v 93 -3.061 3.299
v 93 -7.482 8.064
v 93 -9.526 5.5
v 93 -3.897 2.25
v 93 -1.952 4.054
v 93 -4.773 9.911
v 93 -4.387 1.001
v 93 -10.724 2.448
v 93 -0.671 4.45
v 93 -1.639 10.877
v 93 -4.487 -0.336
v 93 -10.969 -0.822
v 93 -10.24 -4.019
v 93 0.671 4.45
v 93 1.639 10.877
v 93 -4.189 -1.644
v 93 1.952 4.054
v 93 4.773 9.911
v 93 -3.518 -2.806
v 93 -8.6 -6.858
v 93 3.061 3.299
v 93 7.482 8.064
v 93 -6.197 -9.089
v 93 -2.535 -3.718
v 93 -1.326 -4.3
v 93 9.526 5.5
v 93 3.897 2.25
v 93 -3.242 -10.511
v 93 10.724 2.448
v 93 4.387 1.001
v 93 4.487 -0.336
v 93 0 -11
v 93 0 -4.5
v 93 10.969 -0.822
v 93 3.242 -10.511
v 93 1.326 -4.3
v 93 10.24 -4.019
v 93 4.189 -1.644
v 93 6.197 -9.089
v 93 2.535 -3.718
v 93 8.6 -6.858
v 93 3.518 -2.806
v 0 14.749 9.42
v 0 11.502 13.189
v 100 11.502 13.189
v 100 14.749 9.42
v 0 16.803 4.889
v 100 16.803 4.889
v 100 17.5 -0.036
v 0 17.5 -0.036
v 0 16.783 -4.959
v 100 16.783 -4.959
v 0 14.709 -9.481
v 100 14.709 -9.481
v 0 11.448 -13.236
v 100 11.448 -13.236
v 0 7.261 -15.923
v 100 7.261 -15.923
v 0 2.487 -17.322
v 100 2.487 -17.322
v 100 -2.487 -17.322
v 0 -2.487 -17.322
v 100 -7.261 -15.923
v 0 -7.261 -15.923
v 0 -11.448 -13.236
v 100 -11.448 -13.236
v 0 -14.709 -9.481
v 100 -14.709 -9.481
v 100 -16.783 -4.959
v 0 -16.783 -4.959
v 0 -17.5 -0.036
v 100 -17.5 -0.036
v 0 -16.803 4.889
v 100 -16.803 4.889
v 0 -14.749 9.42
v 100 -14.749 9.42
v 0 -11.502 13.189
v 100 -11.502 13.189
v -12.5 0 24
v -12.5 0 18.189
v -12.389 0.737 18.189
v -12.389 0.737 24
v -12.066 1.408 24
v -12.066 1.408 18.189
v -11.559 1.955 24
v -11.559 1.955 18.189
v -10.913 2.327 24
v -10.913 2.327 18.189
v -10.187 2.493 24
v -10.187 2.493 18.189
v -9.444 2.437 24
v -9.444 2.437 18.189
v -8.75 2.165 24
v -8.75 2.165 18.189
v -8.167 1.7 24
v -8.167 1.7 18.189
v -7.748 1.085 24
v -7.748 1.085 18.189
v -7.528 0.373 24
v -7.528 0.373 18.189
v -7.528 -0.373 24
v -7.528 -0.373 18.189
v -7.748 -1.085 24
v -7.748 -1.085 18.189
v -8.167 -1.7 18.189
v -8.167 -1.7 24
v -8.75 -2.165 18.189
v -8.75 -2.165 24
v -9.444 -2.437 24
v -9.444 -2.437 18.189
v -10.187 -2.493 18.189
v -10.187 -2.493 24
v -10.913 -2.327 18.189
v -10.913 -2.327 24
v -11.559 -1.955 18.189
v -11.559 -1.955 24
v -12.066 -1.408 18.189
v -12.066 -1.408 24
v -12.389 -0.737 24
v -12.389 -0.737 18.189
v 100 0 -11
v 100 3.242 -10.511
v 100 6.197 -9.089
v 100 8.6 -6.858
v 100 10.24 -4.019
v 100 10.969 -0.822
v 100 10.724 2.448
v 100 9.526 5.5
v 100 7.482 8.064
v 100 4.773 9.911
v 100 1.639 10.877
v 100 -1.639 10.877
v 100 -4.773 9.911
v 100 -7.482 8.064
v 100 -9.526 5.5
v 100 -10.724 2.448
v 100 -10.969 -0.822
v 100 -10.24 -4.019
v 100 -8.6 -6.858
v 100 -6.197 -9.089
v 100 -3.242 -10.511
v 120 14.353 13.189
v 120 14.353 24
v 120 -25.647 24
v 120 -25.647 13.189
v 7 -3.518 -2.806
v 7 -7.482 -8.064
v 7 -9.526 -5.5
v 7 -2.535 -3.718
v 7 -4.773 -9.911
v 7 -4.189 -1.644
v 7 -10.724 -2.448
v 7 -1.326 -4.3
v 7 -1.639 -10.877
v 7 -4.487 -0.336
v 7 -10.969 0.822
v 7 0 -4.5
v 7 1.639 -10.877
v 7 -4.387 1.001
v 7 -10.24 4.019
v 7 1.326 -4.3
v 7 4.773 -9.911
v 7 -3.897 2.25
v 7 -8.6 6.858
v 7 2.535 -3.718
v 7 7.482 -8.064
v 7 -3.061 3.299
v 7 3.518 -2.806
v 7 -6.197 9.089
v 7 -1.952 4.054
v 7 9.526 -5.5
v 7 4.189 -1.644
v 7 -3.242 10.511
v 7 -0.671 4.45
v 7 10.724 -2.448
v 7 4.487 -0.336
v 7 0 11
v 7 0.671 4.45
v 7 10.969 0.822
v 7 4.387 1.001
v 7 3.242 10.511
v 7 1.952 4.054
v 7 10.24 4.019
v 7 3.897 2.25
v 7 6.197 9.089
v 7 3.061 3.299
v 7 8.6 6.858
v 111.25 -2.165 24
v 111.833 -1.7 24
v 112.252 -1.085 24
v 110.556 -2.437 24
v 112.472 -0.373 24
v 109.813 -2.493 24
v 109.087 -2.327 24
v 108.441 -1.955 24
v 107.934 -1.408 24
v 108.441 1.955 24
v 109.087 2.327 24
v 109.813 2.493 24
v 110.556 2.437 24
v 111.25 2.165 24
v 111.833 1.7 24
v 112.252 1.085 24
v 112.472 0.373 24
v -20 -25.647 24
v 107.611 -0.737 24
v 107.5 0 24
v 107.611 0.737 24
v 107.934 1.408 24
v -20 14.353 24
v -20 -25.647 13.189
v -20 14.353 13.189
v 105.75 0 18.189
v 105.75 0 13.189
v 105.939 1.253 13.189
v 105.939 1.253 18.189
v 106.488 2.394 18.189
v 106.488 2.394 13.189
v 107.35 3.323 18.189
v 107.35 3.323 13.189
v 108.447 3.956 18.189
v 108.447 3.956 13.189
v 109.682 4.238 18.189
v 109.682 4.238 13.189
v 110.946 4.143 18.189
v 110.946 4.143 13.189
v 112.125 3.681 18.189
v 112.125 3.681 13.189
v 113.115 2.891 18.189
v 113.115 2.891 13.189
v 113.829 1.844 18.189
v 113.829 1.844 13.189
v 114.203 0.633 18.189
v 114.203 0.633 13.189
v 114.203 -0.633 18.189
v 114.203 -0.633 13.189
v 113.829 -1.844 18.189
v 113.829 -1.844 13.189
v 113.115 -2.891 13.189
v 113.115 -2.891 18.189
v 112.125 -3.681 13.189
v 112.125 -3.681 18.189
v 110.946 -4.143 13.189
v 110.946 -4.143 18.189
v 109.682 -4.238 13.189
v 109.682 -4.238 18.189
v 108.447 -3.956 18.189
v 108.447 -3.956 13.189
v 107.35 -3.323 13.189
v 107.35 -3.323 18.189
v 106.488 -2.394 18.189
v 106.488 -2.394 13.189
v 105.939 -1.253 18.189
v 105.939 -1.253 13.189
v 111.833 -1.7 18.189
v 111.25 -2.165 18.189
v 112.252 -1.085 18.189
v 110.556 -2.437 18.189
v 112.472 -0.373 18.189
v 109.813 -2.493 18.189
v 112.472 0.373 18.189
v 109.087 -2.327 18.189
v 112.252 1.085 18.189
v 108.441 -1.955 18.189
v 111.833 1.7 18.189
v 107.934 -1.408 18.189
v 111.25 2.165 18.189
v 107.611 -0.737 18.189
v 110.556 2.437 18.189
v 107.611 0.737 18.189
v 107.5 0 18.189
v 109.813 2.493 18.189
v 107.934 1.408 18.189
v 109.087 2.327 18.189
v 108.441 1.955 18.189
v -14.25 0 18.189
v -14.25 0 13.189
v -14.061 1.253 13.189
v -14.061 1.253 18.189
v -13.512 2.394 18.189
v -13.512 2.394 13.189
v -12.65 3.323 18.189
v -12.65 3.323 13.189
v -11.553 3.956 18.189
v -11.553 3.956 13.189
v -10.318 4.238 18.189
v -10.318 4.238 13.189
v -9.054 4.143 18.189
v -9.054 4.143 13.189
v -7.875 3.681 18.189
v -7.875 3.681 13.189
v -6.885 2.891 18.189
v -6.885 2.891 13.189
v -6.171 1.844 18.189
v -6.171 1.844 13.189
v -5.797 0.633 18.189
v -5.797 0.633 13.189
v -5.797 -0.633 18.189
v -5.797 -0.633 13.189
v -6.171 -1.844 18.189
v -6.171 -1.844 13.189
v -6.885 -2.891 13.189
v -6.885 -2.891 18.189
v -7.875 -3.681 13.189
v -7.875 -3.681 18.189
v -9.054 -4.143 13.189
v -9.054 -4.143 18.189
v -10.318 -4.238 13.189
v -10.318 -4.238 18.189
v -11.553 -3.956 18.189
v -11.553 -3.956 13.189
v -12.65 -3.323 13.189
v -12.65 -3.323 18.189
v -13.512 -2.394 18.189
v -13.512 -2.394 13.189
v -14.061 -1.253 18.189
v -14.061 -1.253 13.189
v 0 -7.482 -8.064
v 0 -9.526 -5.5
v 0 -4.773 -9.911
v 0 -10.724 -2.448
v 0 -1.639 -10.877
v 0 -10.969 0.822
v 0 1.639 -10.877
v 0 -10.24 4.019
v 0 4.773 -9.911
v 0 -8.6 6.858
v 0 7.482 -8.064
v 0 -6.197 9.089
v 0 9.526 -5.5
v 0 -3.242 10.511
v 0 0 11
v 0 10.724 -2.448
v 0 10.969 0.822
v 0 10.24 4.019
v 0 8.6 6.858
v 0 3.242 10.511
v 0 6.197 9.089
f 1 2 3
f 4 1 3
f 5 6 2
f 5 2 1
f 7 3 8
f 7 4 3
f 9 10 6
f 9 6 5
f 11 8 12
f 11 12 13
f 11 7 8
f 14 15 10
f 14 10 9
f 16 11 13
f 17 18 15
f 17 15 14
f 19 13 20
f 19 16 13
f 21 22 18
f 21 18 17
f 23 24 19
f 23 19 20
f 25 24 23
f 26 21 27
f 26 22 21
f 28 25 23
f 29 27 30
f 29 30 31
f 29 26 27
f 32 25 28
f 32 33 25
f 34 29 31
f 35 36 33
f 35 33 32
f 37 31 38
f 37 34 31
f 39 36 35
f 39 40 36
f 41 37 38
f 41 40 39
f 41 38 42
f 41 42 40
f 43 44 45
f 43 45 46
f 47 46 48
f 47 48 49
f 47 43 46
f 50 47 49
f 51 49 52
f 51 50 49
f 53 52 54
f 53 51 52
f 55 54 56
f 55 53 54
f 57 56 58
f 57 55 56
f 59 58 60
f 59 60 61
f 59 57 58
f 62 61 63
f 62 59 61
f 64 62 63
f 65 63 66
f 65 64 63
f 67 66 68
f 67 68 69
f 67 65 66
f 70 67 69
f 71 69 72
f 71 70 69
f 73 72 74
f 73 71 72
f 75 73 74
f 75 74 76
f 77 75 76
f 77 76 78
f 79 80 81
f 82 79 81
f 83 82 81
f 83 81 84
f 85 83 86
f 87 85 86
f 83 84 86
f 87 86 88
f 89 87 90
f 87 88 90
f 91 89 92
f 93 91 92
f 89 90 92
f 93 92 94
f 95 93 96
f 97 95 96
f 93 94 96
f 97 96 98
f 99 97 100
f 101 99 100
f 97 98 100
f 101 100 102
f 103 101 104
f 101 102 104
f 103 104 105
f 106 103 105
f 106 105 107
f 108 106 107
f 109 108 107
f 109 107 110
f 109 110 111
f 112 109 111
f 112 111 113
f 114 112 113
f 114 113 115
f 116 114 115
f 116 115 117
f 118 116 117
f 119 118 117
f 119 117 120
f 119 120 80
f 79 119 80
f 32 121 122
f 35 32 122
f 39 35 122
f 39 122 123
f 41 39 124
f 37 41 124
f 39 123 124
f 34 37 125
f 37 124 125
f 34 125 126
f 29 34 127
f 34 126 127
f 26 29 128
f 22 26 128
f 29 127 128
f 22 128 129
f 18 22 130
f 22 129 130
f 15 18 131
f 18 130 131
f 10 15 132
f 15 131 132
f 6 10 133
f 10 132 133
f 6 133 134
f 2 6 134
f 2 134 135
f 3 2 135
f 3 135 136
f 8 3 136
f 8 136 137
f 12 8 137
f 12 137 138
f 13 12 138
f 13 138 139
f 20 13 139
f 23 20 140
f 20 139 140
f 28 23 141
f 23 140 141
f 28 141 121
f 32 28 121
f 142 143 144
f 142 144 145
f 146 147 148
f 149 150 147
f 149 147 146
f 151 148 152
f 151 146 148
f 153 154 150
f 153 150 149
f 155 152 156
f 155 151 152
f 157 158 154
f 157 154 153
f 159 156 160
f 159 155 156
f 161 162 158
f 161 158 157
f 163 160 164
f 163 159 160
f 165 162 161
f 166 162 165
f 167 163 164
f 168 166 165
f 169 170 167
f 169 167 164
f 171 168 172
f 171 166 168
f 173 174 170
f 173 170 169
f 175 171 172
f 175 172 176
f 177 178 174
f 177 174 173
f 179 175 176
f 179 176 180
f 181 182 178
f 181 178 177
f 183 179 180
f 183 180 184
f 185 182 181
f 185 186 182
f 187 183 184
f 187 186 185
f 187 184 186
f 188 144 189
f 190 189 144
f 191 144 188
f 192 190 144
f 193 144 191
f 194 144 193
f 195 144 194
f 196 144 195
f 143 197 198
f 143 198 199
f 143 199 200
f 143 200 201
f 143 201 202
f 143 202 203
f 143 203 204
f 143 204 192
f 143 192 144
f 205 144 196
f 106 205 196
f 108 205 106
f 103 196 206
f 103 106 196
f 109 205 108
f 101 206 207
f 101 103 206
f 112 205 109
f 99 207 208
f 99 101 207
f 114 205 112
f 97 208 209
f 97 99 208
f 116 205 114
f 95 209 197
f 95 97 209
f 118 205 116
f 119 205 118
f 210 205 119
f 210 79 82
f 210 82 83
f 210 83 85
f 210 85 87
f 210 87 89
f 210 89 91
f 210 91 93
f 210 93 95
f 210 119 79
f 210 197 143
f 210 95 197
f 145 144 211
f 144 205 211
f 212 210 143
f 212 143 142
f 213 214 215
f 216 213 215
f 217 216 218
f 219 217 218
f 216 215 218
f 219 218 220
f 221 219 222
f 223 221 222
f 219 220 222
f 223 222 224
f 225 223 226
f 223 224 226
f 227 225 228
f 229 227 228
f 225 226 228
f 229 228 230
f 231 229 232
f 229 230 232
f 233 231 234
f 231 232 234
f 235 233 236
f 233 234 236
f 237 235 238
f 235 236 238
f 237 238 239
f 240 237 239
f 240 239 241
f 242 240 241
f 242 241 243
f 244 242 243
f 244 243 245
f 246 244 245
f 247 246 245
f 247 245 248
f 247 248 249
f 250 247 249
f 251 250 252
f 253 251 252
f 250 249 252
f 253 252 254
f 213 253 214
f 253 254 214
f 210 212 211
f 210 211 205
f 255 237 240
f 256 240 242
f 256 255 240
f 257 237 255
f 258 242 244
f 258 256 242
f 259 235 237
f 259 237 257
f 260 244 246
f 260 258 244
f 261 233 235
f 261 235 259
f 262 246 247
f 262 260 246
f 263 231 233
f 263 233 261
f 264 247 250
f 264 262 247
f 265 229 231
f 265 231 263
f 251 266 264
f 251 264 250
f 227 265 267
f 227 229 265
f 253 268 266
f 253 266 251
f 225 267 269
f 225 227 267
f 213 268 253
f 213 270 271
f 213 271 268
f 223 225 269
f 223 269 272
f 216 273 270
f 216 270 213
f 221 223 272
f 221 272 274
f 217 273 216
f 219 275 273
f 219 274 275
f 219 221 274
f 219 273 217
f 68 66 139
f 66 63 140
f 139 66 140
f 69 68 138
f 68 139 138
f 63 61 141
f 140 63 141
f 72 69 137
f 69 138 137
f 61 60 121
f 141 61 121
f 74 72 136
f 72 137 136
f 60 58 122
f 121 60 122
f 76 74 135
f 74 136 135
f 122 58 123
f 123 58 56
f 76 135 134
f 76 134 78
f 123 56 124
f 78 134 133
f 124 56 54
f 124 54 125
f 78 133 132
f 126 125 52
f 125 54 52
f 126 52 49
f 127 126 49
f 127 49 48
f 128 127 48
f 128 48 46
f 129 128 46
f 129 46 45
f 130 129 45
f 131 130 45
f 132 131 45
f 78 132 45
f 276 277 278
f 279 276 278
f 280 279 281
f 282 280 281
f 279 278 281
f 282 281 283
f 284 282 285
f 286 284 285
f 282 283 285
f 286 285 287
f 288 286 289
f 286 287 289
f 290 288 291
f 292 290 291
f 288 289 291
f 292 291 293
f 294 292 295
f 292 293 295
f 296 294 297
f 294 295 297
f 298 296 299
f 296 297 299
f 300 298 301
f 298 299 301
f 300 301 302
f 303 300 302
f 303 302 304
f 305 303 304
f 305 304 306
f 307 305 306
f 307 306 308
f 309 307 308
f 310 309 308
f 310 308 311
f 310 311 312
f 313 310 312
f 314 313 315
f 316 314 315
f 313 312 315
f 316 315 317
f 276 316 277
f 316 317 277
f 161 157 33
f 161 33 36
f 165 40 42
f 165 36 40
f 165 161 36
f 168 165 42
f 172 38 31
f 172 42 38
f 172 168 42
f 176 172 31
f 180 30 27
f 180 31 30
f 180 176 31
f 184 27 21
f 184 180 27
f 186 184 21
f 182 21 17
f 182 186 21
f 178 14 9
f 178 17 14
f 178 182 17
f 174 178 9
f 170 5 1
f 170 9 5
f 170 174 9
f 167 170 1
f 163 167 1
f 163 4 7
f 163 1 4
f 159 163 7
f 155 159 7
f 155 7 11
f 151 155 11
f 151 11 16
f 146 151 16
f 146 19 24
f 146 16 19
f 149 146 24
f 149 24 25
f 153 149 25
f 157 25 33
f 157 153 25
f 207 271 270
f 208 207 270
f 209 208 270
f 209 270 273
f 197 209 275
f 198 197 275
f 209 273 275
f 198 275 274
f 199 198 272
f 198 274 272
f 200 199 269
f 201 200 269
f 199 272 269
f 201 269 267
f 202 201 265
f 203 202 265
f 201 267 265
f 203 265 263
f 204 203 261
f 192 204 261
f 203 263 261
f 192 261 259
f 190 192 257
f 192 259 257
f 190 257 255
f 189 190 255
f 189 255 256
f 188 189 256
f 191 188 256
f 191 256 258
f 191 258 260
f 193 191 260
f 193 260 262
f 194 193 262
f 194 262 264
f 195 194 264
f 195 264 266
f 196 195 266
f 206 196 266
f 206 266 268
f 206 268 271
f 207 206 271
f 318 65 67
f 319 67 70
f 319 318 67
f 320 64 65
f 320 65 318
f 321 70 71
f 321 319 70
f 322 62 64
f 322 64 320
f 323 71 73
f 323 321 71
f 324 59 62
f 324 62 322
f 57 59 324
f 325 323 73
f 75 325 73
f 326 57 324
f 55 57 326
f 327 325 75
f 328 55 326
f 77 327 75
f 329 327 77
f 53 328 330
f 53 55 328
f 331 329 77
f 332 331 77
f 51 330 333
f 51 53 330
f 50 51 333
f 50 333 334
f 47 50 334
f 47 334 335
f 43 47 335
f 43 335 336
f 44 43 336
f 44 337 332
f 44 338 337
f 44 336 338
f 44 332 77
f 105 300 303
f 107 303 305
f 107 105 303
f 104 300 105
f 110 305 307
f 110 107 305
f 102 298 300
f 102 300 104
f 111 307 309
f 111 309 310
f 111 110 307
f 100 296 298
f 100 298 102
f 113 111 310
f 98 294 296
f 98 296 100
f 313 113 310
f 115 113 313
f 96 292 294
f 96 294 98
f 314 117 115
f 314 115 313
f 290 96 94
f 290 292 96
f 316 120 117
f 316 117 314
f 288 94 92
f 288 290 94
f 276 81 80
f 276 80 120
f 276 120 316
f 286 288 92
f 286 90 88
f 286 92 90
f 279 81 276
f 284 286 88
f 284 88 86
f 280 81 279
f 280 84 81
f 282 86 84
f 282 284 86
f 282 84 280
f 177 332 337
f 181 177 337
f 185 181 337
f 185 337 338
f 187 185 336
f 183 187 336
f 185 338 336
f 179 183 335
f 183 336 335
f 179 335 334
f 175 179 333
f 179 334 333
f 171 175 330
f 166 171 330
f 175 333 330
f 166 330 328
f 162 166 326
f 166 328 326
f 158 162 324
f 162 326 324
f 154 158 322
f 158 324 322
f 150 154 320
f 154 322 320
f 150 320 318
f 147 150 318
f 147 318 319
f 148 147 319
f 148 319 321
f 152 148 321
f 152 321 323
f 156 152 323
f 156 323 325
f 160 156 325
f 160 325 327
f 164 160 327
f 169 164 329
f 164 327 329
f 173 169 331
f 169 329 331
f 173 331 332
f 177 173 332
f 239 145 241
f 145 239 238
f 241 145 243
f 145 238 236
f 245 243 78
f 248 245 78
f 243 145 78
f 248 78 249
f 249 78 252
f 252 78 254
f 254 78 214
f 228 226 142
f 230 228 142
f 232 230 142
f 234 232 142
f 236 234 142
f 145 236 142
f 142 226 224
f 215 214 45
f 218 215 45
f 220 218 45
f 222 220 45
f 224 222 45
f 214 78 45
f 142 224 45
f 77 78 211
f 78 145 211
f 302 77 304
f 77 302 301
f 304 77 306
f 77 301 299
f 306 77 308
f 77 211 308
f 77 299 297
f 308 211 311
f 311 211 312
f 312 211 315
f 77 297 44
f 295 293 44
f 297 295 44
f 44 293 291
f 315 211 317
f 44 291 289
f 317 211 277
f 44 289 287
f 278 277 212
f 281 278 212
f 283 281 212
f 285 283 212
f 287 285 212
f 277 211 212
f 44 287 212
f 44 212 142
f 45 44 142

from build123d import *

# Parameters (mm, degrees)
SKETCH_1_R          = 4.5
EXTRUDE_1_DEPTH     = 100
SKETCH_2_W          = 10.811132722
SKETCH_2_H          = 40
EXTRUDE_2_DEPTH     = 20
SKETCH_3_W          = 10.811132722
SKETCH_3_H          = 40
EXTRUDE_3_DEPTH     = 20
SKETCH_4_R          = 2.5
CUT_EXTRUDE_1_DEPTH = 11.811132722
SKETCH_5_R          = 4.25
CUT_EXTRUDE_2_DEPTH = 5
SKETCH_6_R          = 11
CUT_EXTRUDE_3_DEPTH = 7
SKETCH_7_R          = 11
CUT_EXTRUDE_4_DEPTH = 7


with BuildPart() as part:
    # Эскиз1 → Бобышка-Вытянуть1 (new body)
    with BuildSketch(Plane(origin=(0, 0, 0), x_dir=(0, 0, -1), z_dir=(1, 0, 0))):
        with BuildLine():
            Line((-24, 14.353267579), (-13.188867278, 14.353267579))
            Line((-13.188867278, 14.353267579), (-13.188867278, 11.502338019))
            ThreePointArc((-13.188867278, 11.502338019), (17.5, 0), (-13.188867278, -11.502338019))
            Line((-13.188867278, -11.502338019), (-13.188867278, -25.646732421))
            Line((-13.188867278, -25.646732421), (-24, -25.646732421))
            Line((-24, -25.646732421), (-24, 14.353267579))
        make_face()
        Circle(SKETCH_1_R, mode=Mode.SUBTRACT)
    extrude(amount=EXTRUDE_1_DEPTH)

    # Эскиз2 → Бобышка-Вытянуть2 (add)
    with BuildSketch(Plane.ZY):
        with Locations((18.594433639, -5.646732421)):
            Rectangle(SKETCH_2_W, SKETCH_2_H)
    extrude(amount=EXTRUDE_2_DEPTH)

    # Эскиз3 → Бобышка-Вытянуть3 (add)
    with BuildSketch(Plane(origin=(100, 0, 0), x_dir=(0, 0, -1), z_dir=(1, 0, 0))):
        with Locations((-18.594433639, -5.646732421)):
            Rectangle(SKETCH_3_W, SKETCH_3_H)
    extrude(amount=EXTRUDE_3_DEPTH)

    # Эскиз4 → Вырез-Вытянуть1 (cut, through all)
    with BuildSketch(Plane(origin=(0, 0, 13.188867278), x_dir=(-1, 0, 0), z_dir=(0, 0, -1))):
        with Locations((-110, 0)):
            Circle(SKETCH_4_R)
        with Locations((10, 0)):
            Circle(SKETCH_4_R)
    extrude(amount=-CUT_EXTRUDE_1_DEPTH, mode=Mode.SUBTRACT)

    # Эскиз5 → Вырез-Вытянуть2 (cut)
    with BuildSketch(Plane(origin=(0, 0, 13.188867278), x_dir=(-1, 0, 0), z_dir=(0, 0, -1))):
        with Locations((-110, 0)):
            Circle(SKETCH_5_R)
        with Locations((10, 0)):
            Circle(SKETCH_5_R)
    extrude(amount=-CUT_EXTRUDE_2_DEPTH, mode=Mode.SUBTRACT)

    # Эскиз6 → Вырез-Вытянуть3 (cut)
    with BuildSketch(Plane(origin=(100, 0, 0), x_dir=(0, 0, -1), z_dir=(1, 0, 0))):
        Circle(SKETCH_6_R)
    extrude(amount=-CUT_EXTRUDE_3_DEPTH, mode=Mode.SUBTRACT)

    # Эскиз7 → Вырез-Вытянуть4 (cut)
    with BuildSketch(Plane.ZY):
        Circle(SKETCH_7_R)
    extrude(amount=-CUT_EXTRUDE_4_DEPTH, mode=Mode.SUBTRACT)


solid = part.part
